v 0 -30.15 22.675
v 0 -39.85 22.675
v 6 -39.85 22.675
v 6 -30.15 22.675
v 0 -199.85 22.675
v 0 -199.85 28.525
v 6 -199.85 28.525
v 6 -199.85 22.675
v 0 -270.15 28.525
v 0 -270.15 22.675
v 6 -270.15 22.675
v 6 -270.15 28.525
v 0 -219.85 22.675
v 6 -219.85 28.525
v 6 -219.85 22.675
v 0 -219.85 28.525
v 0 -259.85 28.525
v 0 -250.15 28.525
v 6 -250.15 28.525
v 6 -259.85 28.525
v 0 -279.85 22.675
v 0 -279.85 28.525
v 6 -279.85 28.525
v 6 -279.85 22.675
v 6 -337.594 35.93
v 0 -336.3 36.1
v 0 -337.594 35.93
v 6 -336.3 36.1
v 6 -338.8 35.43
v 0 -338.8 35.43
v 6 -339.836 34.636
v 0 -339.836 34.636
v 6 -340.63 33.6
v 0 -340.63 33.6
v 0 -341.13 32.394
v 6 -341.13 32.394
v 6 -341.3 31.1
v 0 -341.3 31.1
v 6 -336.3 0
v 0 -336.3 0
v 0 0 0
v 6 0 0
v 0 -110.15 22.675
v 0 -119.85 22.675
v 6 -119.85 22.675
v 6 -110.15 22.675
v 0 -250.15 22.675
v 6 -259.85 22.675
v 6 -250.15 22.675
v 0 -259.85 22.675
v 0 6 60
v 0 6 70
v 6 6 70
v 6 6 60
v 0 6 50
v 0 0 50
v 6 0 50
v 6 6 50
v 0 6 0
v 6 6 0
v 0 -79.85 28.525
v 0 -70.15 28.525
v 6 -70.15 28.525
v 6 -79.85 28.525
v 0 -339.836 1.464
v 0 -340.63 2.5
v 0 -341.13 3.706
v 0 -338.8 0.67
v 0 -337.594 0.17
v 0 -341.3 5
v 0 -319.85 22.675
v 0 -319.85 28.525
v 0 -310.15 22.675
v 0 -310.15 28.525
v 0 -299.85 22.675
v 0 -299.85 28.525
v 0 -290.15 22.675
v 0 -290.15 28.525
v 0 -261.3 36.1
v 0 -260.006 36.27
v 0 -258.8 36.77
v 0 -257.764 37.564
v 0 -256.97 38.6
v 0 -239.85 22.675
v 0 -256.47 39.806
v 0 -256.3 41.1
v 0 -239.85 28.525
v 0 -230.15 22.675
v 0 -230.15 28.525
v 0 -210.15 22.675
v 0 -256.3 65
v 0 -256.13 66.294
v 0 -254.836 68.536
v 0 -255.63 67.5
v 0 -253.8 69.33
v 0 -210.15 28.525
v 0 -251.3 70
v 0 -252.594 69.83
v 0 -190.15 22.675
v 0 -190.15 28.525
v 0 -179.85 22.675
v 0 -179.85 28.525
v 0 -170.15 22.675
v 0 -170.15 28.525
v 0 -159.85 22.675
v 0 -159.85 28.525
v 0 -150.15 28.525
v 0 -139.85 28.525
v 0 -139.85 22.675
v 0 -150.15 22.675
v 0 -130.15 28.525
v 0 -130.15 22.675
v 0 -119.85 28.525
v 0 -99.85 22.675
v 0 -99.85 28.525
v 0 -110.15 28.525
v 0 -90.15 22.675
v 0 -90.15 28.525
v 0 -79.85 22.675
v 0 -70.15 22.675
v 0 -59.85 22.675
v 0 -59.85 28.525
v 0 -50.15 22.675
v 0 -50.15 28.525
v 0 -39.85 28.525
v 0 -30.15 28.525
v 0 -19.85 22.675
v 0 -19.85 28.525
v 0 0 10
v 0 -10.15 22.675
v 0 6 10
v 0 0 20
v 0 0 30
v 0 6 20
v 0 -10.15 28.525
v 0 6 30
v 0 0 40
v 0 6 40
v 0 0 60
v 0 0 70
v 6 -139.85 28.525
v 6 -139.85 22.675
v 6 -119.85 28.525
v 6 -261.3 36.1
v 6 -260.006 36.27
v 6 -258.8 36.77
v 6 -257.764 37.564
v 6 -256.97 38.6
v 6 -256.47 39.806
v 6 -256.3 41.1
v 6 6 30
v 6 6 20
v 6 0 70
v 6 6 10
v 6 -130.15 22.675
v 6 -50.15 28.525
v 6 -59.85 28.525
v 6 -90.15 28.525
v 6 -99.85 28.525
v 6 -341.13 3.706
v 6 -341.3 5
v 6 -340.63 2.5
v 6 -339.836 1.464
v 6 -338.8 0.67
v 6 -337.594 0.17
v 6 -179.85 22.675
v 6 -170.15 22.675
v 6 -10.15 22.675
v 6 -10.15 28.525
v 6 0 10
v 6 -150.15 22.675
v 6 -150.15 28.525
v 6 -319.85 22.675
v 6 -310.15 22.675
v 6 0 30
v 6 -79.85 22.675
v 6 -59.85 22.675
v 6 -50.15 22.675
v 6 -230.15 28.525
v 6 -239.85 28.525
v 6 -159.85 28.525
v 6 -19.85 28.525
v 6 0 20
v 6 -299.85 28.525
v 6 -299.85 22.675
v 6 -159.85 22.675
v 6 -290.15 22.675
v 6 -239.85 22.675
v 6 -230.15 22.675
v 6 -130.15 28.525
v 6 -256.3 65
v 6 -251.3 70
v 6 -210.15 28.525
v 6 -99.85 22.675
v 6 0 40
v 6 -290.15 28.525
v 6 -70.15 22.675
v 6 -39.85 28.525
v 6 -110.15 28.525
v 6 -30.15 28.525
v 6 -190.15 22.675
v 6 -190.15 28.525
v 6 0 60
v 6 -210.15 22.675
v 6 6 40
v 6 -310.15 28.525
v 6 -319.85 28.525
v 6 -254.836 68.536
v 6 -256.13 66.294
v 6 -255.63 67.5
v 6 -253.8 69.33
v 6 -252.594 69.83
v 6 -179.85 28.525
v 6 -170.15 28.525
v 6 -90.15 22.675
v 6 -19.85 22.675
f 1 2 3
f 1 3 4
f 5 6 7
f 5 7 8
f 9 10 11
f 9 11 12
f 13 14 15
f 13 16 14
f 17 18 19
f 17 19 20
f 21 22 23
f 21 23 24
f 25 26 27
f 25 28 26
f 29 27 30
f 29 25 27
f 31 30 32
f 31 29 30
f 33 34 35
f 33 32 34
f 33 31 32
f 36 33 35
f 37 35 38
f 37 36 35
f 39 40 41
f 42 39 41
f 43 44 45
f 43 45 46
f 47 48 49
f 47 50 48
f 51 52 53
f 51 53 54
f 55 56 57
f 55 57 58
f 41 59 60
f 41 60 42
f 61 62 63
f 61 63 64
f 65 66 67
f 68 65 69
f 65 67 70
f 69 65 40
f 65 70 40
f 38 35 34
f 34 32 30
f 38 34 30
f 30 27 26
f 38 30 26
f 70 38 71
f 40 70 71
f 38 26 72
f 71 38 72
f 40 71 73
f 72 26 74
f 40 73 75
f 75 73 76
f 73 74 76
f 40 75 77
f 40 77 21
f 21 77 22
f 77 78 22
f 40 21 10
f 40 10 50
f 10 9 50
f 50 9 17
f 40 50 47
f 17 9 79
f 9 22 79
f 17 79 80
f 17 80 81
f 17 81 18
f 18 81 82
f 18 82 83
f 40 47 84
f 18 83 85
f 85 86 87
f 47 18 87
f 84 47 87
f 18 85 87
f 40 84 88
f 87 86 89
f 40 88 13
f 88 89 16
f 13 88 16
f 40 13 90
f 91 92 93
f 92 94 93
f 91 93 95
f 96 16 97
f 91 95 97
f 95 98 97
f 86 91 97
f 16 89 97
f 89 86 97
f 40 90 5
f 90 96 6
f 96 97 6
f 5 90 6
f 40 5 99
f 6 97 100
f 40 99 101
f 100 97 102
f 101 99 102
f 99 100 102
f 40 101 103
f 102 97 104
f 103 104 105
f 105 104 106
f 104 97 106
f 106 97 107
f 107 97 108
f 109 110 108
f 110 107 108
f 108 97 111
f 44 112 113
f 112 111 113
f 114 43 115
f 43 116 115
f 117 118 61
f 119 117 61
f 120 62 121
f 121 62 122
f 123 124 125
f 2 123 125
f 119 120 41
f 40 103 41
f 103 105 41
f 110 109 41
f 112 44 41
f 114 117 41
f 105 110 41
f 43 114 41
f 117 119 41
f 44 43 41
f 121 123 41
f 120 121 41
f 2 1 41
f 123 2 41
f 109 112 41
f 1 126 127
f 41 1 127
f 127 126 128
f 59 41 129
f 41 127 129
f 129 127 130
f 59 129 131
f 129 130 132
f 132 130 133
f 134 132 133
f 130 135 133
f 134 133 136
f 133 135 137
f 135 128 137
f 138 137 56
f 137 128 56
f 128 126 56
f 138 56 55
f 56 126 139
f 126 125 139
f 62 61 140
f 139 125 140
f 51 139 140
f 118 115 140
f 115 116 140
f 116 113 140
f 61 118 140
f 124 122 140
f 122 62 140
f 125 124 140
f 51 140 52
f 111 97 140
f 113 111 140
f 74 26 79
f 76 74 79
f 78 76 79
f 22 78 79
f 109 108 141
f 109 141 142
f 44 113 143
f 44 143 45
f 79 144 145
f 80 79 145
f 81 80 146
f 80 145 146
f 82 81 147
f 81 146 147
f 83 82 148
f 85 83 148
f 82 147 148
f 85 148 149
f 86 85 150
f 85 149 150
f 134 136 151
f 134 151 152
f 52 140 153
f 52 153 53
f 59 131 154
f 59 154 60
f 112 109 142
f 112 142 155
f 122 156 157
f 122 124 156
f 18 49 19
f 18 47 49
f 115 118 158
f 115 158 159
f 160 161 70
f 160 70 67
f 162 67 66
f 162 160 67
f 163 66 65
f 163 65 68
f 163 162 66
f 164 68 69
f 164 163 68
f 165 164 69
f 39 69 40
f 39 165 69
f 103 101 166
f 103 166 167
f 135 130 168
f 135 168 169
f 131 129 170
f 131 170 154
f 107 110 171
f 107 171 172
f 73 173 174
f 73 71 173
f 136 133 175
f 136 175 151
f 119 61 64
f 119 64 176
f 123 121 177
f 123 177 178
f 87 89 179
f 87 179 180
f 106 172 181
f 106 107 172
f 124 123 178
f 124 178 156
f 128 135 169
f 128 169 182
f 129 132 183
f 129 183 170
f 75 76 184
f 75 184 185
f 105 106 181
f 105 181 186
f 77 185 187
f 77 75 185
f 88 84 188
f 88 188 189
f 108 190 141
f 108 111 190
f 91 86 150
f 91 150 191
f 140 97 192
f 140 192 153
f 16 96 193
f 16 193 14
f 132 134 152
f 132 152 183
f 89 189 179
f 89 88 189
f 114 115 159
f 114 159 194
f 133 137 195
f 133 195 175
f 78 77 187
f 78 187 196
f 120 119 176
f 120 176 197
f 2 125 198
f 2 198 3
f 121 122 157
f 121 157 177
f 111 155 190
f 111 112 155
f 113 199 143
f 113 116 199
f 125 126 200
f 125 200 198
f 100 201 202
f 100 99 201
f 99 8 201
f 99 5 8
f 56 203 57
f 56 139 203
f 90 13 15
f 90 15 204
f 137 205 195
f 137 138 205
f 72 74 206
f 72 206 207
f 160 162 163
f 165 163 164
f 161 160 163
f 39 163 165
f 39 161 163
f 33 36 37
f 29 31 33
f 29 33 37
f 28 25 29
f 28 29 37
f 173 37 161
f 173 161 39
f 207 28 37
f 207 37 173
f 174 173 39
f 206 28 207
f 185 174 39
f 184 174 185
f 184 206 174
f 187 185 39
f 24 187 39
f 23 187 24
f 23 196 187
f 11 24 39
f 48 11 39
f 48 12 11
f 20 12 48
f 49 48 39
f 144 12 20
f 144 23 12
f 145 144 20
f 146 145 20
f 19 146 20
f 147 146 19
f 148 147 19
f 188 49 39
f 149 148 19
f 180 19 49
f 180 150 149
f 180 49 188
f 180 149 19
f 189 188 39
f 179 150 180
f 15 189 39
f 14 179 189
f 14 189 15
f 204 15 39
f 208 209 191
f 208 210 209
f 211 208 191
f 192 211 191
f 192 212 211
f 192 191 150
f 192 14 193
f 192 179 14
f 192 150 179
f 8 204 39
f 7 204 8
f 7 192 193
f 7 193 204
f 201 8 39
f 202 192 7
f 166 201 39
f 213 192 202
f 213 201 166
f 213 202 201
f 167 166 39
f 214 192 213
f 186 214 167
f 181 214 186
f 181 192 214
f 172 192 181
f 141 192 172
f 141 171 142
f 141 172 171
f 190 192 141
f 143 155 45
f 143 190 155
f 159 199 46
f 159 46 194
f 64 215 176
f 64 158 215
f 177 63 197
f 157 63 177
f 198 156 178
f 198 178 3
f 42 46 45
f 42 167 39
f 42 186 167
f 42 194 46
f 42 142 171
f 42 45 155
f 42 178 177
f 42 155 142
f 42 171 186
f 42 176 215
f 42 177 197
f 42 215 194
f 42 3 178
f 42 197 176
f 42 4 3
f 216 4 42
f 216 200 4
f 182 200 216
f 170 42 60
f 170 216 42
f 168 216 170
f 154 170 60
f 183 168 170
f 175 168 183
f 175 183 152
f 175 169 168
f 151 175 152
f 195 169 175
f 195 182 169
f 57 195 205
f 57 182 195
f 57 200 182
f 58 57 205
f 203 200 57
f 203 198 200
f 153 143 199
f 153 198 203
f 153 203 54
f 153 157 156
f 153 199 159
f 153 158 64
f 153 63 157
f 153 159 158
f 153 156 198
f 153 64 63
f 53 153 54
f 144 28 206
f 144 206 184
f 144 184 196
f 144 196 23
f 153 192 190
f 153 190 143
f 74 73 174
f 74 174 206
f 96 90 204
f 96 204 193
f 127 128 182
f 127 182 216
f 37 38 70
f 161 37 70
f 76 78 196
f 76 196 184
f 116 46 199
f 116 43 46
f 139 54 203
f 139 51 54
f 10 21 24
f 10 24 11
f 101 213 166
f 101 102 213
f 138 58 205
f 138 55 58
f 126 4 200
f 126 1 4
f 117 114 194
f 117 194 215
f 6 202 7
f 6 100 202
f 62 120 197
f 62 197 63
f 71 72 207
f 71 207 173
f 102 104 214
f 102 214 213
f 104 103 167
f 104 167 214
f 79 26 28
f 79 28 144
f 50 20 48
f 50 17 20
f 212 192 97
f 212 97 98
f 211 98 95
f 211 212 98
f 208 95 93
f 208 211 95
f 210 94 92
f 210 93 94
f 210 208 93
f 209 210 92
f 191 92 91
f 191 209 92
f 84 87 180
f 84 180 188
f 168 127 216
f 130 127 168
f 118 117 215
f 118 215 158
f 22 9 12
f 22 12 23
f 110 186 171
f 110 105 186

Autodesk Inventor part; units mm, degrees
ref_plane "YZ Plane" through (0, 0, 0) normal (1, 0, 0) x (0, 1, 0)
ref_plane "XZ Plane" through (0, 0, 0) normal (0, 1, 0) x (-1, 0, 0)
ref_plane "XY Plane" through (0, 0, 0) normal (0, 0, 1) x (1, 0, 0)
sketch "Sketch1" plane through (0, 0, 0) normal (1, 0, 0) x (0, 1, 0)
  line L0 (0, 70) -> (-341.3, 70) construction
  line L1 (-341.3, 70) -> (-341.3, 0) construction
  line L2 (-341.3, 0) -> (0, 0)
  line L3 (0, 0) -> (0, 60) construction
  line L4 (0, 70) -> (6, 70)
  line L5 (6, 70) -> (6, 60)
  line L6 (6, 60) -> (0, 60)
  line L7 (0, 50) -> (6, 50)
  line L8 (6, 50) -> (6, 40)
  line L9 (6, 40) -> (0, 40)
  line L10 (0, 30) -> (6, 30)
  line L11 (6, 30) -> (6, 20)
  line L12 (6, 20) -> (0, 20)
  line L13 (0, 10) -> (6, 10)
  line L14 (6, 10) -> (6, 0)
  line L15 (6, 0) -> (0, 0)
  line L16 (0, 60) -> (0, 50)
  line L17 (0, 40) -> (0, 30)
  line L18 (0, 20) -> (0, 10)
  line L19 (-10.15, 28.525) -> (-19.85, 28.525)
  line L20 (-19.85, 28.525) -> (-19.85, 22.675)
  line L21 (-19.85, 22.675) -> (-10.15, 22.675)
  line L22 (-10.15, 22.675) -> (-10.15, 28.525)
  line L23 (-10, 28.6) -> (-331.3, 28.6) construction
  line L24 (-331.3, 28.6) -> (-331.3, 22.6) construction
  line L25 (-331.3, 22.6) -> (-10, 22.6) construction
  line L26 (-10, 22.6) -> (-10, 28.6) construction
  line L27 (-15, 28.6) -> (-15, 22.6) construction
  line L28 (-30.15, 22.675) -> (-30.15, 28.525)
  line L29 (-30.15, 28.525) -> (-39.85, 28.525)
  line L30 (-39.85, 22.675) -> (-30.15, 22.675)
  line L31 (-39.85, 28.525) -> (-39.85, 22.675)
  line L32 (-50.15, 22.675) -> (-50.15, 28.525)
  line L33 (-50.15, 28.525) -> (-59.85, 28.525)
  line L34 (-59.85, 22.675) -> (-50.15, 22.675)
  line L35 (-59.85, 28.525) -> (-59.85, 22.675)
  line L36 (-70.15, 22.675) -> (-70.15, 28.525)
  line L37 (-70.15, 28.525) -> (-79.85, 28.525)
  line L38 (-79.85, 22.675) -> (-70.15, 22.675)
  line L39 (-79.85, 28.525) -> (-79.85, 22.675)
  line L40 (-90.15, 22.675) -> (-90.15, 28.525)
  line L41 (-90.15, 28.525) -> (-99.85, 28.525)
  line L42 (-99.85, 22.675) -> (-90.15, 22.675)
  line L43 (-99.85, 28.525) -> (-99.85, 22.675)
  line L44 (-110.15, 22.675) -> (-110.15, 28.525)
  line L45 (-110.15, 28.525) -> (-119.85, 28.525)
  line L46 (-119.85, 22.675) -> (-110.15, 22.675)
  line L47 (-119.85, 28.525) -> (-119.85, 22.675)
  line L48 (-130.15, 22.675) -> (-130.15, 28.525)
  line L49 (-130.15, 28.525) -> (-139.85, 28.525)
  line L50 (-139.85, 22.675) -> (-130.15, 22.675)
  line L51 (-139.85, 28.525) -> (-139.85, 22.675)
  line L52 (-150.15, 22.675) -> (-150.15, 28.525)
  line L53 (-150.15, 28.525) -> (-159.85, 28.525)
  line L54 (-159.85, 22.675) -> (-150.15, 22.675)
  line L55 (-159.85, 28.525) -> (-159.85, 22.675)
  line L56 (-170.15, 22.675) -> (-170.15, 28.525)
  line L57 (-170.15, 28.525) -> (-179.85, 28.525)
  line L58 (-179.85, 22.675) -> (-170.15, 22.675)
  line L59 (-179.85, 28.525) -> (-179.85, 22.675)
  line L60 (-190.15, 22.675) -> (-190.15, 28.525)
  line L61 (-190.15, 28.525) -> (-199.85, 28.525)
  line L62 (-199.85, 22.675) -> (-190.15, 22.675)
  line L63 (-199.85, 28.525) -> (-199.85, 22.675)
  line L64 (-210.15, 22.675) -> (-210.15, 28.525)
  line L65 (-210.15, 28.525) -> (-219.85, 28.525)
  line L66 (-219.85, 22.675) -> (-210.15, 22.675)
  line L67 (-219.85, 28.525) -> (-219.85, 22.675)
  line L68 (-230.15, 22.675) -> (-230.15, 28.525)
  line L69 (-230.15, 28.525) -> (-239.85, 28.525)
  line L70 (-239.85, 22.675) -> (-230.15, 22.675)
  line L71 (-239.85, 28.525) -> (-239.85, 22.675)
  line L72 (-250.15, 22.675) -> (-250.15, 28.525)
  line L73 (-250.15, 28.525) -> (-259.85, 28.525)
  line L74 (-259.85, 22.675) -> (-250.15, 22.675)
  line L75 (-259.85, 28.525) -> (-259.85, 22.675)
  line L76 (-270.15, 22.675) -> (-270.15, 28.525)
  line L77 (-270.15, 28.525) -> (-279.85, 28.525)
  line L78 (-279.85, 22.675) -> (-270.15, 22.675)
  line L79 (-279.85, 28.525) -> (-279.85, 22.675)
  line L80 (-290.15, 22.675) -> (-290.15, 28.525)
  line L81 (-290.15, 28.525) -> (-299.85, 28.525)
  line L82 (-299.85, 22.675) -> (-290.15, 22.675)
  line L83 (-299.85, 28.525) -> (-299.85, 22.675)
  line L84 (-310.15, 22.675) -> (-310.15, 28.525)
  line L85 (-310.15, 28.525) -> (-319.85, 28.525)
  line L86 (-319.85, 22.675) -> (-310.15, 22.675)
  line L87 (-319.85, 28.525) -> (-319.85, 22.675)
  line L88 (-341.3, 36.1) -> (-256.3, 36.1)
  line L89 (-256.3, 36.1) -> (-256.3, 70)
  line L90 (-341.3, 36.1) -> (-341.3, 0)
  line L91 (-256.3, 70) -> (0, 70)
  point P0 (0, 35)
  point P1 (-170.65, 0)
  point P2 (3, 70)
  point P3 (3, 50)
  point P4 (3, 30)
  point P5 (3, 10)
  point P6 (-10.15, 25.6)
  point P7 (-10, 25.6)
  point P8 (0, 35)
  point P9 (-15, 25.6)
  point P10 (-15, 22.675)
  point P11 (-30.15, 25.6)
  point P12 (-35, 22.675)
  point P13 (-50.15, 25.6)
  point P14 (-55, 22.675)
  point P15 (-70.15, 25.6)
  point P16 (-75, 22.675)
  point P17 (-90.15, 25.6)
  point P18 (-95, 22.675)
  point P19 (-110.15, 25.6)
  point P20 (-115, 22.675)
  point P21 (-130.15, 25.6)
  point P22 (-135, 22.675)
  point P23 (-150.15, 25.6)
  point P24 (-155, 22.675)
  point P25 (-170.15, 25.6)
  point P26 (-175, 22.675)
  point P27 (-190.15, 25.6)
  point P28 (-195, 22.675)
  point P29 (-210.15, 25.6)
  point P30 (-215, 22.675)
  point P31 (-230.15, 25.6)
  point P32 (-235, 22.675)
  point P33 (-250.15, 25.6)
  point P34 (-255, 22.675)
  point P35 (-270.15, 25.6)
  point P36 (-275, 22.675)
  point P37 (-290.15, 25.6)
  point P38 (-295, 22.675)
  point P39 (-310.15, 25.6)
  point P40 (-315, 22.675)
  point P41 (-331.3, 25.6)
  dimension "d7" = 70
  dimension "d18" = 6
  dimension "d21" = 10
  dimension "d24" = 341.3
  dimension "d35" = 20
  dimension "d49" = 5.85
  dimension "d50" = 9.7
  dimension "d51" = 6
  dimension "d52" = 9.4
  dimension "d53" = 10
  dimension "d58" = 10
  dimension "d60" = 5
  dimension "d63" = 20
  dimension "d73" = 10.5
  dimension "d74" = 85
extrude "Extrusion1" add sketch "Sketch1" along normal blind 6
fillet "Fillet1" radius 5 4 edges at (3, -256.3, 70) (3, -256.3, 36.1) (3, -341.3, 36.1) (3, -341.3, 0)
equation "\"d7\" = moduleMountH"
equation "\"d18\" = fingerH"
equation "\"d21\" = fingerW"
equation "\"d24\" = supportL"
equation "\"d35\" = fingerSpacing"
equation "\"d49\" = fingerholeH"
equation "\"d50\" = fingerholeW"
equation "\"d51\" = thickness"
equation "\"d52\" = supportsCTCZ"
equation "\"d53\" = 0.5 * fingerSpacing"
equation "\"d58\" = 0.5 * fingerSpacing"
equation "\"d60\" = 0.5 * fingerW"
equation "\"d63\" = fingerSpacing"
equation "\"d74\" = actuatorCableCutoutH"
equation "\"d44\" = thickness"
equation "\"d75\" = supportsFilletR"
equation "\"moduleWidth\" = 118"
equation "\"moduleHeight\" = 96"
equation "\"moduleMountH\" = 70"
equation "\"moduleMountD\" = 6.8"
equation "\"moduleCornerR\" = 5"
equation "\"d4\" = moduleCornerR"
equation "\"d5\" = moduleMountD"
equation "\"d6\" = moduleMountD"
equation "\"d8\" = moduleMountD"
equation "\"d10\" = moduleMountD"
equation "\"moduleOpeningR\" = 25"
equation "\"d13\" = moduleOpeningR"
equation "\"thickness\" = 6"
equation "\"d15\" = thickness"
equation "\"d16\" = 0"
equation "\"kerf\" = 0.15"
equation "\"fingerW\" = 10"
equation "\"fingerSpacing\" = 20"
equation "\"fingerholeW\" = fingerW - 2 * kerf"
equation "\"fingerholeH\" = thickness - kerf"
equation "\"moduleMountClearance\" = 19"
equation "\"actuatorW\" = 28"
equation "\"actuatorH\" = 40.8"
equation "\"openingMFC\" = 45"
equation "\"d28\" = thickness"
equation "\"d29\" = thickness"
equation "\"d30\" = 0.5 * actuatorH + thickness"
equation "\"d31\" = 15"
equation "\"d32\" = fingerholeH"
equation "\"d33\" = fingerholeW"
equation "\"d41\" = fingerholeH"
equation "\"d42\" = fingerholeW"
equation "\"chairThickness\" = 12.7"
equation "\"supportL\" = -chairThickness + dildoL + actuatorMountL - thickness"
equation "\"d0\" = moduleHeight"
equation "\"d1\" = moduleWidth"
equation "\"d17\" = openingMFC"
equation "\"d19\" = moduleMountClearance"
equation "\"fingerH\" = thickness"
equation "\"supportSpacingFromMounting\" = 15"
equation "\"d54\" = fingerholeH"
equation "\"d55\" = fingerholeW"
equation "\"d64\" = 9.4"
equation "\"supportsCTCZ\" = d64"
equation "\"supportXW\" = -2 * thickness + moduleMountW - 2 * supportSpacingFromMounting + kerf"
equation "\"actuatorCableW\" = 35"
equation "\"actuatorCableCutoutH\" = 85"
equation "\"supportsFilletR\" = 5"
equation "\"dildoL\" = 170"
equation "\"actuatorMountL\" = 190"
equation "\"moduleMountW\" = 100"
properties part number "Module_supportZ_cableNotch_MFC"
